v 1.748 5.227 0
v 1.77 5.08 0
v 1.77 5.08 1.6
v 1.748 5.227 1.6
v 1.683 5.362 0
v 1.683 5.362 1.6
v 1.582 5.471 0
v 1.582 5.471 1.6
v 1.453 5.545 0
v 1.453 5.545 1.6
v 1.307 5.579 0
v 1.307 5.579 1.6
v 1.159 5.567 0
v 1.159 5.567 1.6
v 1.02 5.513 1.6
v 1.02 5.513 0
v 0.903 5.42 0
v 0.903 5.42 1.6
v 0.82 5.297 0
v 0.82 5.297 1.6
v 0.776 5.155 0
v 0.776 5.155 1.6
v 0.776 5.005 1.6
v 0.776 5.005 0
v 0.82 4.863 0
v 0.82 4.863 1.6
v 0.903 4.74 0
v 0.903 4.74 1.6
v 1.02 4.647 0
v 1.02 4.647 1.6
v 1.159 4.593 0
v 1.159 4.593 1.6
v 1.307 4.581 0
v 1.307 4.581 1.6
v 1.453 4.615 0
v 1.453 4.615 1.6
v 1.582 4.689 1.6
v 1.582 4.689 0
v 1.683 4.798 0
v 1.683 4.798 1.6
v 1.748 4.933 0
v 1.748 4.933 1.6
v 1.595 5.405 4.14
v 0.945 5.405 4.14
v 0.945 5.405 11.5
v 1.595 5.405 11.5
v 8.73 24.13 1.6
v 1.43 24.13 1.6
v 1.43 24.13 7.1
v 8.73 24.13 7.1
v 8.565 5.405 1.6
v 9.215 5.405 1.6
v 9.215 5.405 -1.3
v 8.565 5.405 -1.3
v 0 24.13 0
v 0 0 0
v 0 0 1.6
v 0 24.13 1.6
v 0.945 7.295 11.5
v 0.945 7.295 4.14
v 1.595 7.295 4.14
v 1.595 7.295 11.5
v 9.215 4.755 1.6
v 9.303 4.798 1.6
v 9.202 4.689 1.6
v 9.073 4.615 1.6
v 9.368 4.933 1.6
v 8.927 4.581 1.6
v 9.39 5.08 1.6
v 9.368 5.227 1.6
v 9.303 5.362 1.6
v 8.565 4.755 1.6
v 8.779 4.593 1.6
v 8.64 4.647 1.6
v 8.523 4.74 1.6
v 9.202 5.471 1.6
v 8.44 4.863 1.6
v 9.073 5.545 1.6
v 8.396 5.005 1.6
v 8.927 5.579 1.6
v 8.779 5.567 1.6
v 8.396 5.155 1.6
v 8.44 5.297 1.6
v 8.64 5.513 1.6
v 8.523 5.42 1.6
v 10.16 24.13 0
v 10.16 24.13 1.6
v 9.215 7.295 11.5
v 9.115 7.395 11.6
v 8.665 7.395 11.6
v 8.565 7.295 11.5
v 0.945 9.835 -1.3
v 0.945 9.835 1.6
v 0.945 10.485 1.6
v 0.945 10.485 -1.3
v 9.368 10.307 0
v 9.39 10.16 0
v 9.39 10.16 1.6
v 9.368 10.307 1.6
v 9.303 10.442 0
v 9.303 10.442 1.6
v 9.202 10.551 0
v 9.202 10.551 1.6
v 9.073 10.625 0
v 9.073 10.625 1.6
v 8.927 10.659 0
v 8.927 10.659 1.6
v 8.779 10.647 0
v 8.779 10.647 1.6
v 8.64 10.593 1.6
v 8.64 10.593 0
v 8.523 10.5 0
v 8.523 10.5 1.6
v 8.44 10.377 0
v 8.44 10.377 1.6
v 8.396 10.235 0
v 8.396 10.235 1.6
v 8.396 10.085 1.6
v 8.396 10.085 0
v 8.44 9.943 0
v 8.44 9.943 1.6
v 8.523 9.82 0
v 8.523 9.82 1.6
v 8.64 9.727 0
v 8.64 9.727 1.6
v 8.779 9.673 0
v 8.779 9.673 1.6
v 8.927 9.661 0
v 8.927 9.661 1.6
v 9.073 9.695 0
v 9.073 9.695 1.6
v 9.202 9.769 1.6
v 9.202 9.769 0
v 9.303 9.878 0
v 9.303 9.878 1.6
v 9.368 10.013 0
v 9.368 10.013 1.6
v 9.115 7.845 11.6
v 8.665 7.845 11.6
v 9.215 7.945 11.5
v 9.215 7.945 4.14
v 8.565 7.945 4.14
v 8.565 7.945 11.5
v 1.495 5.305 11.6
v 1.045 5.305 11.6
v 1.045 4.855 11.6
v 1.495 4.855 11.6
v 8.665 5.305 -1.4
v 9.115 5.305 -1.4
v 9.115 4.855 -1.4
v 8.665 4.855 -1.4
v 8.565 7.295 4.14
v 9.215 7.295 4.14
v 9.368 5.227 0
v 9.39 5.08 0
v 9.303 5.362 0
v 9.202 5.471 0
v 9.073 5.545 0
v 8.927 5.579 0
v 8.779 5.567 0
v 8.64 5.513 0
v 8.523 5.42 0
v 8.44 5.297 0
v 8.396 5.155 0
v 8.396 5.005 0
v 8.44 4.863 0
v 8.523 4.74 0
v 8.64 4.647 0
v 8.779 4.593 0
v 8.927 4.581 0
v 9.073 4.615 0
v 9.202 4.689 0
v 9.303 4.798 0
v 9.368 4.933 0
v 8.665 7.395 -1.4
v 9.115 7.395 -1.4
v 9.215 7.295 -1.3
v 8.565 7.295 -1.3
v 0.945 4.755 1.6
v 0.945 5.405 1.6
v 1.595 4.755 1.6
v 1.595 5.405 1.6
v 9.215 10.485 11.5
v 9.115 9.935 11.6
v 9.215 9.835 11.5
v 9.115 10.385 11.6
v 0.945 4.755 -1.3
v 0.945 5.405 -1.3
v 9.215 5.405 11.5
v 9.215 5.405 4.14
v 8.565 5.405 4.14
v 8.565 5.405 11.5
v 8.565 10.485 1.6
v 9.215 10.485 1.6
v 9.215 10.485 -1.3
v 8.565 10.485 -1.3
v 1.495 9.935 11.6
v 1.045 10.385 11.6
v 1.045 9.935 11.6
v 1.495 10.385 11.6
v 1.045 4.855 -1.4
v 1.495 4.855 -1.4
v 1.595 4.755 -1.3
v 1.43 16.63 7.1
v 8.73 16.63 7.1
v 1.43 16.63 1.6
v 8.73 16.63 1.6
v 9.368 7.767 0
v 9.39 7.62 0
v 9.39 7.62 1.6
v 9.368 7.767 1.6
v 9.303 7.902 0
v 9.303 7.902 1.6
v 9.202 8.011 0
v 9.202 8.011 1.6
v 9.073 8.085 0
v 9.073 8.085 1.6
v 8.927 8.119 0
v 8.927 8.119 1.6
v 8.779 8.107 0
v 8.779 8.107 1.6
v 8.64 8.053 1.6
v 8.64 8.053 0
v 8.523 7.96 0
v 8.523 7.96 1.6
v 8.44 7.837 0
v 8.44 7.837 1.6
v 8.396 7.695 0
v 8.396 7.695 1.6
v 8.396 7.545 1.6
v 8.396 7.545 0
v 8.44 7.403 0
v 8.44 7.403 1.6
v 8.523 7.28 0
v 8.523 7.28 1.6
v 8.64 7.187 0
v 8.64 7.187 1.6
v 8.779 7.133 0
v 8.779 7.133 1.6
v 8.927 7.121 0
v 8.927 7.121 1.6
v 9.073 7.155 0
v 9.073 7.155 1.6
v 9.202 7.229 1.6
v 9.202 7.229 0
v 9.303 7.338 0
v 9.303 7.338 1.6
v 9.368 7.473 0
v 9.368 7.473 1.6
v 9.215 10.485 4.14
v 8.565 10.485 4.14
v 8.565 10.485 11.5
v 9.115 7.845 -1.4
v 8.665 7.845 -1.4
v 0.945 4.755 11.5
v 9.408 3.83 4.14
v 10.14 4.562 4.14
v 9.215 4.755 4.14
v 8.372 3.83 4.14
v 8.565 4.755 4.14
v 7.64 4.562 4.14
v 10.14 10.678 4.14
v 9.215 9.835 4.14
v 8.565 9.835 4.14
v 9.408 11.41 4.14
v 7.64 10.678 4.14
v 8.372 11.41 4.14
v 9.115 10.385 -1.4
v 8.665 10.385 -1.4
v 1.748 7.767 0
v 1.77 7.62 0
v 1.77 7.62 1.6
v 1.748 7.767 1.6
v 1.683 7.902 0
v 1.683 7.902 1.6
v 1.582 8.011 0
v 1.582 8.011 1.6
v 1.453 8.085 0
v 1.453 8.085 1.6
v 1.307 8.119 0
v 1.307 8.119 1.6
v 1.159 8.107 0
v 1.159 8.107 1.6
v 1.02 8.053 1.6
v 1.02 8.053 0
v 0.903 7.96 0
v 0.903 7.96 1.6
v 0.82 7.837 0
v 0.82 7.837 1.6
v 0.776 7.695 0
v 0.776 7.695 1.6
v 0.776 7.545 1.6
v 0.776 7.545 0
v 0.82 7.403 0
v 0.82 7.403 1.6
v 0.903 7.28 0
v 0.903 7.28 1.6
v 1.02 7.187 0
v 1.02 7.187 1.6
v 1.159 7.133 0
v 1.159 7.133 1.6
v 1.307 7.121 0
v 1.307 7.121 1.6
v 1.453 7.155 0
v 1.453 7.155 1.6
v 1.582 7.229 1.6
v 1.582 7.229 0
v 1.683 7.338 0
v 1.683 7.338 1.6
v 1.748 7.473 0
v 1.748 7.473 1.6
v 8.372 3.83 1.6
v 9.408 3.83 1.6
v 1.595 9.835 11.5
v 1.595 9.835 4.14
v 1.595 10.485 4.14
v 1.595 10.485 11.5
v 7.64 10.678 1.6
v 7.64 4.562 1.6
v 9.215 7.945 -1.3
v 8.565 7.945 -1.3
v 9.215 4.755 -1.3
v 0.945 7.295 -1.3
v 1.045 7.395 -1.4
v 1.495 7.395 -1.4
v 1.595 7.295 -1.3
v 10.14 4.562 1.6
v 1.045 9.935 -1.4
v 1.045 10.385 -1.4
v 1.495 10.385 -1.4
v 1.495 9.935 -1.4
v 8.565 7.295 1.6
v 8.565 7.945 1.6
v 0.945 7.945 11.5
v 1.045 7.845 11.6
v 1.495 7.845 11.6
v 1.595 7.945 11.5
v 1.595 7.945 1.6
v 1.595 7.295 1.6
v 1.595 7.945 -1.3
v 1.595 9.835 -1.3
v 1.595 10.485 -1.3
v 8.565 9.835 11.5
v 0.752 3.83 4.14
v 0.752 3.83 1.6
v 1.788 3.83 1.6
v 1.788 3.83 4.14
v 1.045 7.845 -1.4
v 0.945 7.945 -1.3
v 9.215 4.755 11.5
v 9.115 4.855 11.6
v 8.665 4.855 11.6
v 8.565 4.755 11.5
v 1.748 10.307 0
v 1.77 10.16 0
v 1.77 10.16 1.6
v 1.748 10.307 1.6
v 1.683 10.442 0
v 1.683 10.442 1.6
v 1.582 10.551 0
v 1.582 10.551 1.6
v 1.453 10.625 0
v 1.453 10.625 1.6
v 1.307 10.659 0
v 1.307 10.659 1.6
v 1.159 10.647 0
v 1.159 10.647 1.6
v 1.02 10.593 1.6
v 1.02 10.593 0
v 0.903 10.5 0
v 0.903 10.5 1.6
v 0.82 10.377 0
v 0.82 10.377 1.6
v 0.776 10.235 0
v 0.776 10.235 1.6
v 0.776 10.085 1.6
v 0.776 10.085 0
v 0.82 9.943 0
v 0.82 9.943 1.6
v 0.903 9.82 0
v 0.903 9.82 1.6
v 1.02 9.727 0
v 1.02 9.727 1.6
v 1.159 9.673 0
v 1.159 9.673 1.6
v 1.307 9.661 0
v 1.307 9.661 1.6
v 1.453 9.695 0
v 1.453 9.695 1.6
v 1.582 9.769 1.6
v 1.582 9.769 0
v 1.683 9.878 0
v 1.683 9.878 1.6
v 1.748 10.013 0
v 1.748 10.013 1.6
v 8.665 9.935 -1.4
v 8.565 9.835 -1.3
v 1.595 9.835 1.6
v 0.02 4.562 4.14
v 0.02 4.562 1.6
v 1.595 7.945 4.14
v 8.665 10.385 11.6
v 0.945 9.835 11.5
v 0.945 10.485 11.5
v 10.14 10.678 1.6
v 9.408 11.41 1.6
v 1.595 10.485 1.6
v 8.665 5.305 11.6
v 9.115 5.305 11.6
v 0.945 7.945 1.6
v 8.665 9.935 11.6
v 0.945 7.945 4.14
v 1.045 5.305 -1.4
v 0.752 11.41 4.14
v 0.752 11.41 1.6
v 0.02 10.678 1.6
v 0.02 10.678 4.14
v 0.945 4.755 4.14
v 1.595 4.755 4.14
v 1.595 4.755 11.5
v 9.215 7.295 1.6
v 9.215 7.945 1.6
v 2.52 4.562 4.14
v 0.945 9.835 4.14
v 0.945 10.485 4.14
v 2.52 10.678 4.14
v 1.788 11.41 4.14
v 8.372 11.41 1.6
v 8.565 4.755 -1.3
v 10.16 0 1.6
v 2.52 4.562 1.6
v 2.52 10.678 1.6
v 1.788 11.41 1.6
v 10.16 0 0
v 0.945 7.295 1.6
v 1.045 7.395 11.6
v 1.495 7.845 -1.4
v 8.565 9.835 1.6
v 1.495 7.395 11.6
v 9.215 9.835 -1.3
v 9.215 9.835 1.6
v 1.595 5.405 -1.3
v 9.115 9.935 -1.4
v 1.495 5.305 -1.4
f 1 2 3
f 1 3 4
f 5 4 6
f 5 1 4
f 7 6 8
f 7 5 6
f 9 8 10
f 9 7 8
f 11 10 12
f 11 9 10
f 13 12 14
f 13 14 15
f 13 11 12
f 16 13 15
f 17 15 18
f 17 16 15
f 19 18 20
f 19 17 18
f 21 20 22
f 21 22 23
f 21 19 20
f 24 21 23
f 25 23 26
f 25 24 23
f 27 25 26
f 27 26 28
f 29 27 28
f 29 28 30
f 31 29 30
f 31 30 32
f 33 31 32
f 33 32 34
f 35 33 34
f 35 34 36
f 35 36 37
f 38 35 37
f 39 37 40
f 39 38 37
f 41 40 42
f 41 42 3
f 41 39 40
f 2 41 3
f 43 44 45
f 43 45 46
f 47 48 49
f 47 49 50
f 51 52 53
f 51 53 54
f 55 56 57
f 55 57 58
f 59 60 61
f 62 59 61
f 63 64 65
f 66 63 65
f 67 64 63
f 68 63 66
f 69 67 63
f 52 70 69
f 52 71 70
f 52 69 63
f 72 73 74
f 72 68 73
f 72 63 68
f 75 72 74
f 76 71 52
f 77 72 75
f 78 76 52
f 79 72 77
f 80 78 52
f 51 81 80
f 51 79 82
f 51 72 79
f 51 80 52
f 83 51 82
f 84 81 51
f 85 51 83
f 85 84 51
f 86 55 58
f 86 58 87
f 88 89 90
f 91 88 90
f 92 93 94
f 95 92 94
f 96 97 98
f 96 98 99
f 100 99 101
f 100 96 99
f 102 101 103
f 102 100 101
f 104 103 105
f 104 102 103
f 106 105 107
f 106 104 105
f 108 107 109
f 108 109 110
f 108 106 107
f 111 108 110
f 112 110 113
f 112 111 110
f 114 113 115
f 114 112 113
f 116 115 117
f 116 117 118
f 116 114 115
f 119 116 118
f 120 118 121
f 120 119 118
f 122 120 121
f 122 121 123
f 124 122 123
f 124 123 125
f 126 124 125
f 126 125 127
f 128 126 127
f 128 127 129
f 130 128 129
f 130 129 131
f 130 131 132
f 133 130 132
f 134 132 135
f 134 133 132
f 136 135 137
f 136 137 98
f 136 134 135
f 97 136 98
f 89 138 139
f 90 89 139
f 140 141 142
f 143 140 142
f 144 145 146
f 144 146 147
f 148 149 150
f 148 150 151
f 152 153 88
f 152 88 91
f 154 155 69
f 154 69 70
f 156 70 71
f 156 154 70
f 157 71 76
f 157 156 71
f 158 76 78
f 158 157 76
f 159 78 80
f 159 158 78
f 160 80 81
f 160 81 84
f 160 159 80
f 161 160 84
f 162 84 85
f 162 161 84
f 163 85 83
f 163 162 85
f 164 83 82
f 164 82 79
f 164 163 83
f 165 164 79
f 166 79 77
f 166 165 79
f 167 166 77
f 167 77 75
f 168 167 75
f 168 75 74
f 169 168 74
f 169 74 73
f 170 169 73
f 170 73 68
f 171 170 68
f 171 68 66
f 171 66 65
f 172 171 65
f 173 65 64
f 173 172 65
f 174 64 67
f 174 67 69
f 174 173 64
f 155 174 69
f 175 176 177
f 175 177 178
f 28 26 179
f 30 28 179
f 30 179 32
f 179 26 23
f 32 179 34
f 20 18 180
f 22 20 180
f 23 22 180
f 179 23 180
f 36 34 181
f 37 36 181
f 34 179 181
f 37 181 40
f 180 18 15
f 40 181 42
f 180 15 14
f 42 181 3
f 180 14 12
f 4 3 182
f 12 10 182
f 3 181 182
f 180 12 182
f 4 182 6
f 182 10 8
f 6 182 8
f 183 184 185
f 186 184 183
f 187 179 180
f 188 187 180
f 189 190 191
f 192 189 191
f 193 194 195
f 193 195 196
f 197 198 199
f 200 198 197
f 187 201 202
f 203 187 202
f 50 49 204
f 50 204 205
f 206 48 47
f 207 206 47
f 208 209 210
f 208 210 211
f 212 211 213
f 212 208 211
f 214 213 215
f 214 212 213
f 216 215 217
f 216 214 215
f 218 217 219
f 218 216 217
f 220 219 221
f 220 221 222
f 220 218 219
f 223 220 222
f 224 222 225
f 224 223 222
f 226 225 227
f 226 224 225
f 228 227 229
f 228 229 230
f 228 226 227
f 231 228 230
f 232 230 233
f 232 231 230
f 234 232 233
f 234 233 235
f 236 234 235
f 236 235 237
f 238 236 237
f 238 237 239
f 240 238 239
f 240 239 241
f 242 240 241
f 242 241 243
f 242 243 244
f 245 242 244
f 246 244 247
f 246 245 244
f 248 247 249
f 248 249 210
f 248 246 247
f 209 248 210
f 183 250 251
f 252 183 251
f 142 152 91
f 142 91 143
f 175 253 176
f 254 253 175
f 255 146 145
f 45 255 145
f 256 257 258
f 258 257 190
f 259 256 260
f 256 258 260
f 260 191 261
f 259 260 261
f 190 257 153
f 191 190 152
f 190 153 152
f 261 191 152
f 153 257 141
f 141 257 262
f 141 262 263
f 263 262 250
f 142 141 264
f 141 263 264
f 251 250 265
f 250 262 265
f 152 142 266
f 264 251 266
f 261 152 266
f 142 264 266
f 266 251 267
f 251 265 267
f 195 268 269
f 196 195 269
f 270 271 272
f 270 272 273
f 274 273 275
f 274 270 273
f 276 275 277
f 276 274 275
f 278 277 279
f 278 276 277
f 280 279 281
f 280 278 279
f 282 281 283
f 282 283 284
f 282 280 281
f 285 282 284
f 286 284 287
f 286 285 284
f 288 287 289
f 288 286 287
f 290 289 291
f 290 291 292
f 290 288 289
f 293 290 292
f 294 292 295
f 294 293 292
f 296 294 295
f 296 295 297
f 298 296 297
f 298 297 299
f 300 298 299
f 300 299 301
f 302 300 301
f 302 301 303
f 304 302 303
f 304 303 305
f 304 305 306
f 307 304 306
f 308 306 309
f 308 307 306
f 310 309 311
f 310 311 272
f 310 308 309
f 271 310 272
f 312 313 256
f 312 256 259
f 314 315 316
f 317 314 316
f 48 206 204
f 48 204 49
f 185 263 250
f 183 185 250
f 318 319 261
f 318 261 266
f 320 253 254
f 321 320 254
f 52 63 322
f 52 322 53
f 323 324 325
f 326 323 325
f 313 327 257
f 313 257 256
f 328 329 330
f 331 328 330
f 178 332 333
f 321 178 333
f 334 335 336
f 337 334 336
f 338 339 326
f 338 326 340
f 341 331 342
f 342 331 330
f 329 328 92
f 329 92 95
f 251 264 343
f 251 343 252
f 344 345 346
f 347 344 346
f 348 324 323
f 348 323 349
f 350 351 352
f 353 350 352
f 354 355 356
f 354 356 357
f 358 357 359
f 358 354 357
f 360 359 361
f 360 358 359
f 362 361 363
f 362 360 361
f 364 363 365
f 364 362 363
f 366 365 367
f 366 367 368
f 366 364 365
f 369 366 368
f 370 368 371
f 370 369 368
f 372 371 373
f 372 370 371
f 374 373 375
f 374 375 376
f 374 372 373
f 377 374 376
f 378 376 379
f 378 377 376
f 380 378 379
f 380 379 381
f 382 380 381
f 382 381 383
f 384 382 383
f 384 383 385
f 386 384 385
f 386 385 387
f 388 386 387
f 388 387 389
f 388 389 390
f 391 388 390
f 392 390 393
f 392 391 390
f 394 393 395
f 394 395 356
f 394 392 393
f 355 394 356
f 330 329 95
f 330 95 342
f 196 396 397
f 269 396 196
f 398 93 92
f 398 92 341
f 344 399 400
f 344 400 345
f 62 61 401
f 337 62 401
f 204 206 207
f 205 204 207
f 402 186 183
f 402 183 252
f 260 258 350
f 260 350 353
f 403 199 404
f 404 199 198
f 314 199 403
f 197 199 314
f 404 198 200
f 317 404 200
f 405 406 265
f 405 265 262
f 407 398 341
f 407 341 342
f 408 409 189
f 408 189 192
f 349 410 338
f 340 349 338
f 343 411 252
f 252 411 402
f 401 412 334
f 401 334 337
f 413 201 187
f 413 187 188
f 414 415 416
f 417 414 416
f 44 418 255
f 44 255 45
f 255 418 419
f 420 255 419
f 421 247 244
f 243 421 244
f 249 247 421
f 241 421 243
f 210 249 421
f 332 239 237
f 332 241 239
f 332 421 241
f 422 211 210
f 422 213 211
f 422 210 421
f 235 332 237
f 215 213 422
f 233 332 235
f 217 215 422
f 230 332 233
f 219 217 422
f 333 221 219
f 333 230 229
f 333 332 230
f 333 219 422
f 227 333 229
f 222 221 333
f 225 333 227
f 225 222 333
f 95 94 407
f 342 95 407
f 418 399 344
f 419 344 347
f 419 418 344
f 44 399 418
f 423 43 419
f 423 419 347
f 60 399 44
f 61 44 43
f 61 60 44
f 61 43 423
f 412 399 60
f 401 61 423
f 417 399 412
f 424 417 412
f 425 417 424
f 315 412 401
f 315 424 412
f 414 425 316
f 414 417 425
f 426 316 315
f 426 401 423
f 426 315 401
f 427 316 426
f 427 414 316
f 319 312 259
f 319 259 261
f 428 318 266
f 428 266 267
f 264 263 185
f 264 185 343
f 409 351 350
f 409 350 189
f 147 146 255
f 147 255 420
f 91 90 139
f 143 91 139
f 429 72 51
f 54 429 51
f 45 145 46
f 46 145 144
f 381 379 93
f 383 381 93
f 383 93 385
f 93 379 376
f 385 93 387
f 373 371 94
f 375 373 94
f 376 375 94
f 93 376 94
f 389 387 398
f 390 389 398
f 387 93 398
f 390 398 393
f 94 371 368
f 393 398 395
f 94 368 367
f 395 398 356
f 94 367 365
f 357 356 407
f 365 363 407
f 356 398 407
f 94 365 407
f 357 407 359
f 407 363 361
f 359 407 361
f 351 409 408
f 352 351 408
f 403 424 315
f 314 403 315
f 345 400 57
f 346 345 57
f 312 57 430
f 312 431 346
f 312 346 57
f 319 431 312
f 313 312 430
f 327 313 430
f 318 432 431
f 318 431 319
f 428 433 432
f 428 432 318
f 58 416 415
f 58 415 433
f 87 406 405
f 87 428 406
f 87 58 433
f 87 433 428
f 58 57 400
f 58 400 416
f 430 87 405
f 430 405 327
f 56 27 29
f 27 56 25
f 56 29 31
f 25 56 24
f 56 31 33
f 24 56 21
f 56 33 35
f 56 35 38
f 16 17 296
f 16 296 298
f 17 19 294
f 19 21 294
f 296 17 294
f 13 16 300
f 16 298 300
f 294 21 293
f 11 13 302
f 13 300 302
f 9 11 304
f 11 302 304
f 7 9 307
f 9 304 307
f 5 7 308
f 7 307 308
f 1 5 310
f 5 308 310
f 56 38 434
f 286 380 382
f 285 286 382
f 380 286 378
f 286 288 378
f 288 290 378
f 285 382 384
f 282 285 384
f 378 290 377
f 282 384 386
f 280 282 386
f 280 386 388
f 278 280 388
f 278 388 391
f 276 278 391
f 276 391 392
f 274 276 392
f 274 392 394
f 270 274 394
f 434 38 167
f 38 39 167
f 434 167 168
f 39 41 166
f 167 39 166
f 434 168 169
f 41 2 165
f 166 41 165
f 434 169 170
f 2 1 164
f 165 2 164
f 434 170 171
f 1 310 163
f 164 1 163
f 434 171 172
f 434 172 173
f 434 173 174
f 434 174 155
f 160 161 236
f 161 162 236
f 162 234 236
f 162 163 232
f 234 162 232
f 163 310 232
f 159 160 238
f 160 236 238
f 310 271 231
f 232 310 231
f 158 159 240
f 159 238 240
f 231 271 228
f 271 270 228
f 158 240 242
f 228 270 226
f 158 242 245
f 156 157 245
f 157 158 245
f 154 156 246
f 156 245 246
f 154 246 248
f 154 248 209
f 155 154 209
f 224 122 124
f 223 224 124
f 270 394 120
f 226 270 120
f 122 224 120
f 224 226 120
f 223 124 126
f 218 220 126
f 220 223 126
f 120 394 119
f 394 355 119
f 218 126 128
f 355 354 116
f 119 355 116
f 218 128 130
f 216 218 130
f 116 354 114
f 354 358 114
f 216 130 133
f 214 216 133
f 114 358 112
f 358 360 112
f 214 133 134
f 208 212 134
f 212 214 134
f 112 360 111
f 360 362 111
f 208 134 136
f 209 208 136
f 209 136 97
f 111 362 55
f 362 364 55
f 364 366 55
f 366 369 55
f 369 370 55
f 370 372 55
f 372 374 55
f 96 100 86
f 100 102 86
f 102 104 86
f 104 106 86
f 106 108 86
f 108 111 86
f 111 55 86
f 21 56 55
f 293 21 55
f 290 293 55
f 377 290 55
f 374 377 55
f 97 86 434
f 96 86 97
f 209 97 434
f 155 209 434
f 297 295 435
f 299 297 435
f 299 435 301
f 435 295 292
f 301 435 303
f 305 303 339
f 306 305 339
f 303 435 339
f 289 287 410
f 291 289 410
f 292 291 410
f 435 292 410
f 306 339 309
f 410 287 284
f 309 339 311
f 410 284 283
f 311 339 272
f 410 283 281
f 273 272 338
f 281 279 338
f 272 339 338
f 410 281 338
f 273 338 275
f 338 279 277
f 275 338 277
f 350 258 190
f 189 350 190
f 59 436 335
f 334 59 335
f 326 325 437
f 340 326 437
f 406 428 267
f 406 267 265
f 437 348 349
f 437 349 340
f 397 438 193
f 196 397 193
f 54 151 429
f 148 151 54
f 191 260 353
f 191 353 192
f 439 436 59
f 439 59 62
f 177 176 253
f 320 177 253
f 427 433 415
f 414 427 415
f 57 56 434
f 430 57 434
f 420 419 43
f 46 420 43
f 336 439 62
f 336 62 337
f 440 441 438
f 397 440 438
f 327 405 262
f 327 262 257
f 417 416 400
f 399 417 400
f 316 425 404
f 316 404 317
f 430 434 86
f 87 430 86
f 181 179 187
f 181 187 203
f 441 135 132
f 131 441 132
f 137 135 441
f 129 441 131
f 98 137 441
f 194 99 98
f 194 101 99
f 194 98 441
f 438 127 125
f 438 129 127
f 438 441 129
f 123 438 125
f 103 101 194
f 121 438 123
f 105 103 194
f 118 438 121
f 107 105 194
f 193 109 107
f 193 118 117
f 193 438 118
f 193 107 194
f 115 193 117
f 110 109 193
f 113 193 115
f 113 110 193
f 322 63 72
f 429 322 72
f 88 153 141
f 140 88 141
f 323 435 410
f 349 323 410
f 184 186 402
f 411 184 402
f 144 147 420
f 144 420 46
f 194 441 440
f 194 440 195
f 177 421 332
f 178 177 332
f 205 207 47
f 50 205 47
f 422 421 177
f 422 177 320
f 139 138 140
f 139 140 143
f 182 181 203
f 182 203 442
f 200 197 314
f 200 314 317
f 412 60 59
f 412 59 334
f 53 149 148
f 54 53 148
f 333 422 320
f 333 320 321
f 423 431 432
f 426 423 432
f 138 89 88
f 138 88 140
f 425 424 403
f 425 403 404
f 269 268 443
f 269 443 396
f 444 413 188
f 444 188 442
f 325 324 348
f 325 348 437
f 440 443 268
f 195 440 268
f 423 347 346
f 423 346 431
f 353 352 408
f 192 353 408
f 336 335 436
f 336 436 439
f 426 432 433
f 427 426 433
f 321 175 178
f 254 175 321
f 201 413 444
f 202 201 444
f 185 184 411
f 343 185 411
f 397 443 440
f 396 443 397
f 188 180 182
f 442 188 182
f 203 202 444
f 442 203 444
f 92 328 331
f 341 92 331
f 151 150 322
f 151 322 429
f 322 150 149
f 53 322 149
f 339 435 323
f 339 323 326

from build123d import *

# Parameters (mm, degrees)
SKETCH2_W                = 10.16
SKETCH2_H                = 24.13
SKETCH2_R                = 0.5
BOSS_EXTRUDE1_DEPTH      = 1.6
SKETCH3_W                = 7.3
SKETCH3_H                = 7.5
BOSS_EXTRUDE2_DEPTH      = 5.5
BOSS_EXTRUDE3_DEPTH      = 2.54
SKETCH9_W                = 0.65
SKETCH9_H                = 0.65
BOSS_EXTRUDE4_DEPTH      = 10
SKETCH9_2_W              = 0.65
SKETCH9_2_H              = 0.65
BOSS_EXTRUDE5_DEPTH      = 3
CHAMFER1_SIZE            = 0.1
CHAMFER1_OF_MIRROR2_SIZE = 0.1


with BuildPart() as part:
    # Sketch2 → Boss-Extrude1 (new body)
    with BuildSketch(Plane.XY):
        with Locations((5.08, 12.065)):
            Rectangle(SKETCH2_W, SKETCH2_H)
        with Locations((1.27, 5.08)):
            Circle(SKETCH2_R, mode=Mode.SUBTRACT)
        with Locations((1.27, 7.62)):
            Circle(SKETCH2_R, mode=Mode.SUBTRACT)
        with Locations((1.27, 10.16)):
            Circle(SKETCH2_R, mode=Mode.SUBTRACT)
        with Locations((8.89, 10.16)):
            Circle(SKETCH2_R, mode=Mode.SUBTRACT)
        with Locations((8.89, 7.62)):
            Circle(SKETCH2_R, mode=Mode.SUBTRACT)
        with Locations((8.89, 5.08)):
            Circle(SKETCH2_R, mode=Mode.SUBTRACT)
    extrude(amount=BOSS_EXTRUDE1_DEPTH)

    # Sketch8 → Boss-Extrude3 (add)
    with BuildSketch(Plane.XY.offset(1.6)):
        Polygon((0.02, 10.677766953), (0.02, 4.562233047), (0.752233047, 3.83), (1.787766953, 3.83), (2.52, 4.562233047), (2.52, 10.677766953), (1.787766953, 11.41), (0.752233047, 11.41), align=None)
    boss_extrude3 = extrude(amount=BOSS_EXTRUDE3_DEPTH)

    # Sketch9 → Boss-Extrude4 (add)
    with BuildSketch(Plane.XY.offset(1.6)):
        with Locations((1.27, 10.16)):
            Rectangle(SKETCH9_W, SKETCH9_H)
        with Locations((1.27, 7.62)):
            Rectangle(SKETCH9_W, SKETCH9_H)
        with Locations((1.27, 5.08)):
            Rectangle(SKETCH9_W, SKETCH9_H)
    boss_extrude4 = extrude(amount=BOSS_EXTRUDE4_DEPTH)

    # Sketch9<2> → Boss-Extrude5 (add)
    with BuildSketch(Plane.XY.offset(1.6)):
        with Locations((1.27, 10.16)):
            Rectangle(SKETCH9_2_W, SKETCH9_2_H)
        with Locations((1.27, 7.62)):
            Rectangle(SKETCH9_2_W, SKETCH9_2_H)
        with Locations((1.27, 5.08)):
            Rectangle(SKETCH9_2_W, SKETCH9_2_H)
    boss_extrude5 = extrude(amount=-BOSS_EXTRUDE5_DEPTH)

    # Chamfer1
    chamfer1_edges = [part.edges().sort_by_distance(p)[0] for p in [
        (0.945, 5.08, 11.6),
        (1.27, 4.755, 11.6),
        (1.595, 5.08, 11.6),
        (1.27, 5.405, 11.6),
        (0.945, 10.16, -1.4),
        (1.27, 10.485, -1.4),
        (1.595, 10.16, -1.4),
        (1.27, 9.835, -1.4),
        (0.945, 7.62, -1.4),
        (1.27, 7.945, -1.4),
        (1.595, 7.62, -1.4),
        (1.27, 7.295, -1.4),
        (0.945, 5.08, -1.4),
        (1.27, 5.405, -1.4),
        (1.595, 5.08, -1.4),
        (1.27, 4.755, -1.4),
        (0.945, 10.16, 11.6),
        (1.27, 9.835, 11.6),
        (1.595, 10.16, 11.6),
        (1.27, 10.485, 11.6),
        (0.945, 7.62, 11.6),
        (1.27, 7.295, 11.6),
        (1.595, 7.62, 11.6),
        (1.27, 7.945, 11.6),
    ]]
    chamfer(chamfer1_edges, length=CHAMFER1_SIZE)

    # Mirror1: Boss-Extrude3 across plane
    add(boss_extrude3.mirror(Plane(origin=(5.08, 0, 0), x_dir=(0, 0, 1), z_dir=(1, 0, 0))))

    # Mirror2: Boss-Extrude4, Boss-Extrude5 across plane
    add(boss_extrude4.mirror(Plane(origin=(5.08, 0, 0), x_dir=(0, 0, 1), z_dir=(1, 0, 0))))
    add(boss_extrude5.mirror(Plane(origin=(5.08, 0, 0), x_dir=(0, 0, 1), z_dir=(1, 0, 0))))

    # Chamfer1 of Mirror2
    chamfer1_of_mirror2_edges = [part.edges().sort_by_distance(p)[0] for p in [
        (9.215, 5.08, 11.6),
        (8.89, 4.755, 11.6),
        (8.565, 5.08, 11.6),
        (8.89, 5.405, 11.6),
        (9.215, 10.16, -1.4),
        (8.89, 10.485, -1.4),
        (8.565, 10.16, -1.4),
        (8.89, 9.835, -1.4),
        (9.215, 7.62, -1.4),
        (8.89, 7.945, -1.4),
        (8.565, 7.62, -1.4),
        (8.89, 7.295, -1.4),
        (9.215, 5.08, -1.4),
        (8.89, 5.405, -1.4),
        (8.565, 5.08, -1.4),
        (8.89, 4.755, -1.4),
        (9.215, 10.16, 11.6),
        (8.89, 9.835, 11.6),
        (8.565, 10.16, 11.6),
        (8.89, 10.485, 11.6),
        (9.215, 7.62, 11.6),
        (8.89, 7.295, 11.6),
        (8.565, 7.62, 11.6),
        (8.89, 7.945, 11.6),
    ]]
    chamfer(chamfer1_of_mirror2_edges, length=CHAMFER1_OF_MIRROR2_SIZE)


with BuildPart() as body_2:
    # Sketch3 → Boss-Extrude2 (new body)
    with BuildSketch(Plane.XY.offset(1.6)):
        with Locations((5.08, 20.38)):
            Rectangle(SKETCH3_W, SKETCH3_H)
    extrude(amount=BOSS_EXTRUDE2_DEPTH)


solid = Compound([part.part, body_2.part])
